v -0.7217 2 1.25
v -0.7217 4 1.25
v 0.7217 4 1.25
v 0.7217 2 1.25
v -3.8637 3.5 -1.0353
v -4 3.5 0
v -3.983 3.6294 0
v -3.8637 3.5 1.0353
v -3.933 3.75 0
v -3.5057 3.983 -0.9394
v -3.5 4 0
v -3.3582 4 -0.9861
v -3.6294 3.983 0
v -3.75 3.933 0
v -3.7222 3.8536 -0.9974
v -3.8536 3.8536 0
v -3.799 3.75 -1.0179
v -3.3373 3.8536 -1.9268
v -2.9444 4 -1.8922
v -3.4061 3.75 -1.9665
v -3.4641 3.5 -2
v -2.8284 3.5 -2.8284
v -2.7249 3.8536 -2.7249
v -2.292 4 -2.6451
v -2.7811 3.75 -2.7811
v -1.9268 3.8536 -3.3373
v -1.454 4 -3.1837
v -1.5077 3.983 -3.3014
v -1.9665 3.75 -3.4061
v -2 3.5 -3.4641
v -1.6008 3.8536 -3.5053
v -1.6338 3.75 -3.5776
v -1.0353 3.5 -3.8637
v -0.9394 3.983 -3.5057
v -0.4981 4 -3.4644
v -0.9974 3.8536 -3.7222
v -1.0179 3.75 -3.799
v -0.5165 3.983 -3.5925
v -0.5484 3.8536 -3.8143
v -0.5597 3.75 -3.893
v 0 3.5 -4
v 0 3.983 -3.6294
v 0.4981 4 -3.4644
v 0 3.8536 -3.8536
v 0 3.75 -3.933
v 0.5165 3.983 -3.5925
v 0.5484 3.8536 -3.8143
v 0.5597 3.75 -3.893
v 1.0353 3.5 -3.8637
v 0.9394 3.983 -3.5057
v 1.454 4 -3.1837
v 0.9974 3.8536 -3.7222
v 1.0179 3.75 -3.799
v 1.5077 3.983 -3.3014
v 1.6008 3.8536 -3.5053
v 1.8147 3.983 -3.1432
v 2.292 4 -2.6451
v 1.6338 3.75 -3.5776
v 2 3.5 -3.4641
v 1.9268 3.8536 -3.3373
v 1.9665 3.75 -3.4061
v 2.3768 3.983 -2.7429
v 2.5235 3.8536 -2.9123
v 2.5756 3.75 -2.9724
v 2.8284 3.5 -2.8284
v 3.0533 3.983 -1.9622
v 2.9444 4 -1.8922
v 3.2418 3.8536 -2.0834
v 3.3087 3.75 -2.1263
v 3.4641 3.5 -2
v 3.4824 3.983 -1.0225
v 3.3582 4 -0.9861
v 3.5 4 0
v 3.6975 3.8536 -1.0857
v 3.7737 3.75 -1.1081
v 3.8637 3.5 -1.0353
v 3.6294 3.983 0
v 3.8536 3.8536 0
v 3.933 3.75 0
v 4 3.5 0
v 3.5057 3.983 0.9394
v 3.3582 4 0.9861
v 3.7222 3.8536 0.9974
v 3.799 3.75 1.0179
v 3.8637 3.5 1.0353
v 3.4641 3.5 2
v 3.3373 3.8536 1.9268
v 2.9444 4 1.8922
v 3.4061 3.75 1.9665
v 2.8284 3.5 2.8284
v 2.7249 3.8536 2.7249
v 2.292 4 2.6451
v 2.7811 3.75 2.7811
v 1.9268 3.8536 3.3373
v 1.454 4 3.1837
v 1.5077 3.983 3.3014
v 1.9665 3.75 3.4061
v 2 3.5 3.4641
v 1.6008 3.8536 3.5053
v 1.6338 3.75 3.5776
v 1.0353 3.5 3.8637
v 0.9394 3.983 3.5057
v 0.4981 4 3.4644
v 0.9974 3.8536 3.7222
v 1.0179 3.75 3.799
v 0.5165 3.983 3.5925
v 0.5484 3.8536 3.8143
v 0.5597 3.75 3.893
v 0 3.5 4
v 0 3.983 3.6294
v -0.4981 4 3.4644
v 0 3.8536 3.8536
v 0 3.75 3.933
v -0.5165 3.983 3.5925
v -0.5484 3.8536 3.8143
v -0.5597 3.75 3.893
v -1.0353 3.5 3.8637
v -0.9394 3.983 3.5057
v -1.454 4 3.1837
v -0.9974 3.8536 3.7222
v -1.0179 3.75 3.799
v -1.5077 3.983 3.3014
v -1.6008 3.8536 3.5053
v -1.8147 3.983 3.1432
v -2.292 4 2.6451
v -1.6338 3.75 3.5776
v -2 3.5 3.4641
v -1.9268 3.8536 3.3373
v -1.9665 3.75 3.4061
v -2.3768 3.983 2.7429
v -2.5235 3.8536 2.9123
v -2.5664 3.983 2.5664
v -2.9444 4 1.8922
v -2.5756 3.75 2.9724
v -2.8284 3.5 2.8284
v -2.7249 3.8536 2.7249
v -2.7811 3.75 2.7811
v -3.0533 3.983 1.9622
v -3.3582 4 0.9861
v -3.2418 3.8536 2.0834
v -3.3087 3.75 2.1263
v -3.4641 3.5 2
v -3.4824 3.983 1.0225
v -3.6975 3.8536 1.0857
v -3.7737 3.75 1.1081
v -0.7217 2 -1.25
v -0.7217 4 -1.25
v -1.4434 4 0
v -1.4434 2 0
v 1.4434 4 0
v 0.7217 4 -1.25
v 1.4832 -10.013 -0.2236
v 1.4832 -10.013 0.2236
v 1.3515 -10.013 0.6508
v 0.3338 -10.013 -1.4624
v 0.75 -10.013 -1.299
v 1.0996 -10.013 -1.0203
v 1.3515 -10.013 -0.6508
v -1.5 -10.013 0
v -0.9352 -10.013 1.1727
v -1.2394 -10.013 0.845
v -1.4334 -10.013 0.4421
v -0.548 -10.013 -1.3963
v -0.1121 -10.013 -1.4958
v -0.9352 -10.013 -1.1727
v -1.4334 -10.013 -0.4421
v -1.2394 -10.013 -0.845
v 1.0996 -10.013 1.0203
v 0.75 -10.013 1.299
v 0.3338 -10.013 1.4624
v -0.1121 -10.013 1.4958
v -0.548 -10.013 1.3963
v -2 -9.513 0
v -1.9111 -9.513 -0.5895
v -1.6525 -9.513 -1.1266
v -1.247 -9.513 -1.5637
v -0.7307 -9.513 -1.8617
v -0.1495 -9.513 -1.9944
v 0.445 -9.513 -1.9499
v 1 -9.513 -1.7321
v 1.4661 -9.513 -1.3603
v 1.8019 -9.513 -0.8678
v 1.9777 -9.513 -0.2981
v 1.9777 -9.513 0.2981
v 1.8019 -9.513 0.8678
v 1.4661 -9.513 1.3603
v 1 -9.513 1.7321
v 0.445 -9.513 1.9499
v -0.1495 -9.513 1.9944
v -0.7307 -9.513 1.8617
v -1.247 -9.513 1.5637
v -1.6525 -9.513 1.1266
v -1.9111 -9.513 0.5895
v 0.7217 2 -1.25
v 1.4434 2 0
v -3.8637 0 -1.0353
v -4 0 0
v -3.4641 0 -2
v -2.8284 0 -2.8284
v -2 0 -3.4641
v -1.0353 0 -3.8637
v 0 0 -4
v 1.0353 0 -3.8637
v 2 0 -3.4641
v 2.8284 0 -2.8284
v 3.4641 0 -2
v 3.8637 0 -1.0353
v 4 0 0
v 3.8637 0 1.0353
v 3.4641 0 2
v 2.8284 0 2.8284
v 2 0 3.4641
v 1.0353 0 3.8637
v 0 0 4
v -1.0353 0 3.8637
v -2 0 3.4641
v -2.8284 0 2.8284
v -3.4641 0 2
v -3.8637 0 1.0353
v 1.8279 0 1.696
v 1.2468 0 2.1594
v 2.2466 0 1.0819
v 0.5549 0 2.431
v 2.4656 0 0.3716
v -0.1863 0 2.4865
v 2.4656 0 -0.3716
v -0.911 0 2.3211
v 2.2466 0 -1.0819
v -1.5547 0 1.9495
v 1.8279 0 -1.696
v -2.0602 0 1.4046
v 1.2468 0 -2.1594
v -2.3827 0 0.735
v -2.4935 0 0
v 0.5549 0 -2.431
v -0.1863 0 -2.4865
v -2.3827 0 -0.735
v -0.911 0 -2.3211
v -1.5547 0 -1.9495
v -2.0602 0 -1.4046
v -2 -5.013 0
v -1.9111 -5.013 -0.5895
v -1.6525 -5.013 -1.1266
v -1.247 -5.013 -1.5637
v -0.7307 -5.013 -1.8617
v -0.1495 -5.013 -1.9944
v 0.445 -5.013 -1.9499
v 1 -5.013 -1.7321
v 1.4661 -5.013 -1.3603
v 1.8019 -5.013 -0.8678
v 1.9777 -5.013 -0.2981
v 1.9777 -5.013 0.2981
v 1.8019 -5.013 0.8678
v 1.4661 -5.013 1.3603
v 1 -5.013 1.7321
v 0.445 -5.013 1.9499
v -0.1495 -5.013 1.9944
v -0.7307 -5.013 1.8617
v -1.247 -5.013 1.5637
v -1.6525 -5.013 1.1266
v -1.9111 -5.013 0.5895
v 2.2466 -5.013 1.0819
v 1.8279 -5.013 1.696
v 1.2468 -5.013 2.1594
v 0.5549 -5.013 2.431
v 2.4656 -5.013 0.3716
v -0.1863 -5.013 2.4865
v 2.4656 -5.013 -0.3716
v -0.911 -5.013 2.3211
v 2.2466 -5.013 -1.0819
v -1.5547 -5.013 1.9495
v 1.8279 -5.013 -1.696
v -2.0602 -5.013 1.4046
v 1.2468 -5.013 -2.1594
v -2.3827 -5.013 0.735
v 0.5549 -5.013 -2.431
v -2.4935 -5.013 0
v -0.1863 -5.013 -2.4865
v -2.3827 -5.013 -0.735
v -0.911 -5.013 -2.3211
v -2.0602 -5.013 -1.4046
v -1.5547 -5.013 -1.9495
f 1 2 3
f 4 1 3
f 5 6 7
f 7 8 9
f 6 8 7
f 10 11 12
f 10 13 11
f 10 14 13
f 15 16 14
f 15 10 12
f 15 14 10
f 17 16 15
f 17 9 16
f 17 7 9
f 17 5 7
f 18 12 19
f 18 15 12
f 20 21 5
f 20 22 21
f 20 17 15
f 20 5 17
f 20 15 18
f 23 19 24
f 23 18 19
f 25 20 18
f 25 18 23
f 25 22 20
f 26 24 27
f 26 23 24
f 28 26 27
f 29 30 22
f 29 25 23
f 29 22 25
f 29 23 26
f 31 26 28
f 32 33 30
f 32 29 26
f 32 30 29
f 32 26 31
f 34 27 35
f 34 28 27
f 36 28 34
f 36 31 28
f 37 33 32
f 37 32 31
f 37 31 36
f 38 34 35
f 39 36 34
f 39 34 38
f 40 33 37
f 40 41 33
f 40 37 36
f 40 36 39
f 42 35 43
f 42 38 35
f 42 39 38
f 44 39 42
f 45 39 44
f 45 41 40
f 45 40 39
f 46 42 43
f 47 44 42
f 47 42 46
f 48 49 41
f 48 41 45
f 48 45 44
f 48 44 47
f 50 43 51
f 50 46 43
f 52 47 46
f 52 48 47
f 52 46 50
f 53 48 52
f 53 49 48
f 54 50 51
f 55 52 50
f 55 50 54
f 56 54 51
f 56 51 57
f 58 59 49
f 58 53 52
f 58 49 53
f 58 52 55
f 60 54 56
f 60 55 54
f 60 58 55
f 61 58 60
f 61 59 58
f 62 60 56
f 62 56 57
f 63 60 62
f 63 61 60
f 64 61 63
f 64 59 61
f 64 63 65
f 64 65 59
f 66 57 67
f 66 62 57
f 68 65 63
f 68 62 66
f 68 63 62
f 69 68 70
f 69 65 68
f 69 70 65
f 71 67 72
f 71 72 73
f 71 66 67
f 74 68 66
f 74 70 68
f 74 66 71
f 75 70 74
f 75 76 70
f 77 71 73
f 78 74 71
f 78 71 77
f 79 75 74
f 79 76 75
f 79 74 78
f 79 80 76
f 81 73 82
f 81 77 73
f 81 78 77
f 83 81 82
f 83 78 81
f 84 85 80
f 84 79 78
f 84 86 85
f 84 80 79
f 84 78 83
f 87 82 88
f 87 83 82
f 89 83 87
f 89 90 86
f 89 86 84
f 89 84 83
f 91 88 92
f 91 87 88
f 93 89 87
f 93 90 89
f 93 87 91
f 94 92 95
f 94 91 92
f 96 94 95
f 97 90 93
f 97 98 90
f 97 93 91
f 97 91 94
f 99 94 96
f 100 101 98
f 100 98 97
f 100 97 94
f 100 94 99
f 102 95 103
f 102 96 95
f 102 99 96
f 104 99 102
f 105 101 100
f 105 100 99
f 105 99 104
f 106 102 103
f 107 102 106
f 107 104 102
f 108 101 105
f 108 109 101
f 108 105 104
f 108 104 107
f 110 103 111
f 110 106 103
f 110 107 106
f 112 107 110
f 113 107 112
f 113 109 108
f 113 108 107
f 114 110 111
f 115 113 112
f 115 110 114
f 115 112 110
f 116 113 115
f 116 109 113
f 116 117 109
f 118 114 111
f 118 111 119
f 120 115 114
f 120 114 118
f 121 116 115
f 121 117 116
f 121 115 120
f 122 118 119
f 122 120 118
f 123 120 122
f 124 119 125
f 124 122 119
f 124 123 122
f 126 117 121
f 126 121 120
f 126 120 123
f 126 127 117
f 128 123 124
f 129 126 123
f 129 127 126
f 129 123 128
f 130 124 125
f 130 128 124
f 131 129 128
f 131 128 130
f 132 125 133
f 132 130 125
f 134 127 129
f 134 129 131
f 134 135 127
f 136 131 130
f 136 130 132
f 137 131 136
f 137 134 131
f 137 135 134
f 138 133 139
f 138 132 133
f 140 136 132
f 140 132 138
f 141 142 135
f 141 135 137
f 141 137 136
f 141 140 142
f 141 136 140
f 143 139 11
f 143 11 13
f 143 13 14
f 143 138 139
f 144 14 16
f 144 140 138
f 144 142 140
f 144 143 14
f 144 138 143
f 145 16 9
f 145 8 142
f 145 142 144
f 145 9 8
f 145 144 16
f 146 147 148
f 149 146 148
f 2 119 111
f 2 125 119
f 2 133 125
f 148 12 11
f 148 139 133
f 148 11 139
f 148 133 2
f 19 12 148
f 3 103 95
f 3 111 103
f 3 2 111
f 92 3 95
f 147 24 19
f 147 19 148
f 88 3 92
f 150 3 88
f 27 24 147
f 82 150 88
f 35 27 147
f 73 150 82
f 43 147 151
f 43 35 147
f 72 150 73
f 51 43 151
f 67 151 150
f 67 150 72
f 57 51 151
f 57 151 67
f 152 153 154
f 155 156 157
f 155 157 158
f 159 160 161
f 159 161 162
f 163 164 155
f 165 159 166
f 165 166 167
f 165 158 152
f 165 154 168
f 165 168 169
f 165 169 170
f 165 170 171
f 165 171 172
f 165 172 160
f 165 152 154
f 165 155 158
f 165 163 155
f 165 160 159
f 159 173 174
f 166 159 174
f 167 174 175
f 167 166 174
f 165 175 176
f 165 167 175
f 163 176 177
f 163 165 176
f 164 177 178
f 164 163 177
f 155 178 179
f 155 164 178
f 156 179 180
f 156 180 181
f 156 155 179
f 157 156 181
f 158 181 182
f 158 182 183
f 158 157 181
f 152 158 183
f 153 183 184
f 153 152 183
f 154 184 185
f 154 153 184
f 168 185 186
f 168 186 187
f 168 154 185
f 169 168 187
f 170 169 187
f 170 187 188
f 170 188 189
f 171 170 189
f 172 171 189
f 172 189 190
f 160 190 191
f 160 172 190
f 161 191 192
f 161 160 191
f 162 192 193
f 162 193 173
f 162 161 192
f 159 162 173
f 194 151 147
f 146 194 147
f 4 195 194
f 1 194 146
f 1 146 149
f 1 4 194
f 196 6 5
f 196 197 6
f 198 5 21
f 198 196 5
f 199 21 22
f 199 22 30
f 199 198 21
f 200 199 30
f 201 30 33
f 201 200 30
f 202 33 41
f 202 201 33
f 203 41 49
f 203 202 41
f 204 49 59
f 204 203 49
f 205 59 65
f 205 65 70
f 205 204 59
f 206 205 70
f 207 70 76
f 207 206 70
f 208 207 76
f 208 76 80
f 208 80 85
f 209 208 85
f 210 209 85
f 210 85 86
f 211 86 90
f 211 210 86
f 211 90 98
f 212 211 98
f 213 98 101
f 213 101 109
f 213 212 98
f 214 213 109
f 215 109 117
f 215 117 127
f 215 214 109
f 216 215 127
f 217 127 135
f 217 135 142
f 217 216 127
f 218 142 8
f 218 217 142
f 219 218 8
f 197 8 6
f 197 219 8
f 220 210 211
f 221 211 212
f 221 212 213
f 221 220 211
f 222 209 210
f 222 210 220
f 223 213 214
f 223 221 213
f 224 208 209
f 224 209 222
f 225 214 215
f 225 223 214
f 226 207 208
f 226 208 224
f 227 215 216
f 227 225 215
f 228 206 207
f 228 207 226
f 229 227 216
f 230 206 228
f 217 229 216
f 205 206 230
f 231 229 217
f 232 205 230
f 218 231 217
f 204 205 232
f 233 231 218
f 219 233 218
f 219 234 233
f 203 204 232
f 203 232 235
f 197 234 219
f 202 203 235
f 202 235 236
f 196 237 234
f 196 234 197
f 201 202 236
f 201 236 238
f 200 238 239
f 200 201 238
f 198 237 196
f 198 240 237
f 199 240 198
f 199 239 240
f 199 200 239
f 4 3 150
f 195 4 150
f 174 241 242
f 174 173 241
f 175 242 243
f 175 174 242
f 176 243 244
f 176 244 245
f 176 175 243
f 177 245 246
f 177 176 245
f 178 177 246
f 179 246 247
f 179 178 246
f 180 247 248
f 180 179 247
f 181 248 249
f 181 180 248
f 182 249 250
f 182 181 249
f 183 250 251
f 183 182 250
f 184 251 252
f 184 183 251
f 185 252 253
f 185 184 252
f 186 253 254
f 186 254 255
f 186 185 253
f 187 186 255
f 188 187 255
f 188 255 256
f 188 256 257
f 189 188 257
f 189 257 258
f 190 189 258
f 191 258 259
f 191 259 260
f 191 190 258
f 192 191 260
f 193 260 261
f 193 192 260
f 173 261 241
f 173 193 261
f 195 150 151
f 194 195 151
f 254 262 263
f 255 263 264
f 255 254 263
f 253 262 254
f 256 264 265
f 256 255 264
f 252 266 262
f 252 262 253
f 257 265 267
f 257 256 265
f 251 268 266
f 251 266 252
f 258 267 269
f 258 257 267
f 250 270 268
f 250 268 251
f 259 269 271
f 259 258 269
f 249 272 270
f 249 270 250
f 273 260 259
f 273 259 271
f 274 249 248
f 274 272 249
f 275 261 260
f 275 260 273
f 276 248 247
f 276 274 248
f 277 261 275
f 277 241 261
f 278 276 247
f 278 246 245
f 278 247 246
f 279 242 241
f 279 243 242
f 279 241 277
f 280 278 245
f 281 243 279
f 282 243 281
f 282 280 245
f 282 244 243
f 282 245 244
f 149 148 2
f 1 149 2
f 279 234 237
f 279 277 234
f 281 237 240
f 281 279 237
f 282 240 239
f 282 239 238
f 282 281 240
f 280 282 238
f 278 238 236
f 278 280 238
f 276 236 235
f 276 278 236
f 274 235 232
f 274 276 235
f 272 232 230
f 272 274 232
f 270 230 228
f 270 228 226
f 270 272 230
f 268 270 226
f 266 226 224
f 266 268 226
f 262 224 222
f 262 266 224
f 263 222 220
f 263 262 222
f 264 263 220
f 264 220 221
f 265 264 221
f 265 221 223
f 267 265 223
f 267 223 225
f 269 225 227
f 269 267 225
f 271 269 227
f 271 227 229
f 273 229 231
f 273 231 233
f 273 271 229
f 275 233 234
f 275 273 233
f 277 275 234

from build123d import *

# Parameters (mm, degrees)
ENL_V_MAT_EXTRU_1_DEPTH = 2


with BuildPart() as part:
    # Esquisse1 → Révolution1 (revolve)
    with BuildSketch(Plane.XY):
        with BuildLine():
            Line((0, 4), (-3.5, 4))
            ThreePointArc((-3.5, 4), (-3.853553391, 3.853553391), (-4, 3.5))
            Line((-4, 3.5), (-4, 0))
            Line((-4, 0), (-2.4935, 0))
            Line((-2.4935, 0), (-2.4935, -5.013))
            Line((-2.4935, -5.013), (-2, -5.013))
            Line((-2, -5.013), (-2, -9.513))
            Line((-2, -9.513), (-1.5, -10.013))
            Line((-1.5, -10.013), (0, -10.013))
            Line((0, -10.013), (0, 4))
        make_face()
    revolve(axis=Axis((0, 15.825722622, 0), (0, -1, 0)))

    # Esquisse2 → Enlèv. mat.-Extru.1 (cut)
    with BuildSketch(Plane(origin=(0, 4, 0), x_dir=(-1, 0, 0), z_dir=(0, 1, 0))):
        Polygon((-1.443375673, 0), (-0.721687836, -1.25), (0.721687836, -1.25), (1.443375673, 0), (0.721687836, 1.25), (-0.721687836, 1.25), align=None)
    extrude(amount=-ENL_V_MAT_EXTRU_1_DEPTH, mode=Mode.SUBTRACT)


solid = part.part
